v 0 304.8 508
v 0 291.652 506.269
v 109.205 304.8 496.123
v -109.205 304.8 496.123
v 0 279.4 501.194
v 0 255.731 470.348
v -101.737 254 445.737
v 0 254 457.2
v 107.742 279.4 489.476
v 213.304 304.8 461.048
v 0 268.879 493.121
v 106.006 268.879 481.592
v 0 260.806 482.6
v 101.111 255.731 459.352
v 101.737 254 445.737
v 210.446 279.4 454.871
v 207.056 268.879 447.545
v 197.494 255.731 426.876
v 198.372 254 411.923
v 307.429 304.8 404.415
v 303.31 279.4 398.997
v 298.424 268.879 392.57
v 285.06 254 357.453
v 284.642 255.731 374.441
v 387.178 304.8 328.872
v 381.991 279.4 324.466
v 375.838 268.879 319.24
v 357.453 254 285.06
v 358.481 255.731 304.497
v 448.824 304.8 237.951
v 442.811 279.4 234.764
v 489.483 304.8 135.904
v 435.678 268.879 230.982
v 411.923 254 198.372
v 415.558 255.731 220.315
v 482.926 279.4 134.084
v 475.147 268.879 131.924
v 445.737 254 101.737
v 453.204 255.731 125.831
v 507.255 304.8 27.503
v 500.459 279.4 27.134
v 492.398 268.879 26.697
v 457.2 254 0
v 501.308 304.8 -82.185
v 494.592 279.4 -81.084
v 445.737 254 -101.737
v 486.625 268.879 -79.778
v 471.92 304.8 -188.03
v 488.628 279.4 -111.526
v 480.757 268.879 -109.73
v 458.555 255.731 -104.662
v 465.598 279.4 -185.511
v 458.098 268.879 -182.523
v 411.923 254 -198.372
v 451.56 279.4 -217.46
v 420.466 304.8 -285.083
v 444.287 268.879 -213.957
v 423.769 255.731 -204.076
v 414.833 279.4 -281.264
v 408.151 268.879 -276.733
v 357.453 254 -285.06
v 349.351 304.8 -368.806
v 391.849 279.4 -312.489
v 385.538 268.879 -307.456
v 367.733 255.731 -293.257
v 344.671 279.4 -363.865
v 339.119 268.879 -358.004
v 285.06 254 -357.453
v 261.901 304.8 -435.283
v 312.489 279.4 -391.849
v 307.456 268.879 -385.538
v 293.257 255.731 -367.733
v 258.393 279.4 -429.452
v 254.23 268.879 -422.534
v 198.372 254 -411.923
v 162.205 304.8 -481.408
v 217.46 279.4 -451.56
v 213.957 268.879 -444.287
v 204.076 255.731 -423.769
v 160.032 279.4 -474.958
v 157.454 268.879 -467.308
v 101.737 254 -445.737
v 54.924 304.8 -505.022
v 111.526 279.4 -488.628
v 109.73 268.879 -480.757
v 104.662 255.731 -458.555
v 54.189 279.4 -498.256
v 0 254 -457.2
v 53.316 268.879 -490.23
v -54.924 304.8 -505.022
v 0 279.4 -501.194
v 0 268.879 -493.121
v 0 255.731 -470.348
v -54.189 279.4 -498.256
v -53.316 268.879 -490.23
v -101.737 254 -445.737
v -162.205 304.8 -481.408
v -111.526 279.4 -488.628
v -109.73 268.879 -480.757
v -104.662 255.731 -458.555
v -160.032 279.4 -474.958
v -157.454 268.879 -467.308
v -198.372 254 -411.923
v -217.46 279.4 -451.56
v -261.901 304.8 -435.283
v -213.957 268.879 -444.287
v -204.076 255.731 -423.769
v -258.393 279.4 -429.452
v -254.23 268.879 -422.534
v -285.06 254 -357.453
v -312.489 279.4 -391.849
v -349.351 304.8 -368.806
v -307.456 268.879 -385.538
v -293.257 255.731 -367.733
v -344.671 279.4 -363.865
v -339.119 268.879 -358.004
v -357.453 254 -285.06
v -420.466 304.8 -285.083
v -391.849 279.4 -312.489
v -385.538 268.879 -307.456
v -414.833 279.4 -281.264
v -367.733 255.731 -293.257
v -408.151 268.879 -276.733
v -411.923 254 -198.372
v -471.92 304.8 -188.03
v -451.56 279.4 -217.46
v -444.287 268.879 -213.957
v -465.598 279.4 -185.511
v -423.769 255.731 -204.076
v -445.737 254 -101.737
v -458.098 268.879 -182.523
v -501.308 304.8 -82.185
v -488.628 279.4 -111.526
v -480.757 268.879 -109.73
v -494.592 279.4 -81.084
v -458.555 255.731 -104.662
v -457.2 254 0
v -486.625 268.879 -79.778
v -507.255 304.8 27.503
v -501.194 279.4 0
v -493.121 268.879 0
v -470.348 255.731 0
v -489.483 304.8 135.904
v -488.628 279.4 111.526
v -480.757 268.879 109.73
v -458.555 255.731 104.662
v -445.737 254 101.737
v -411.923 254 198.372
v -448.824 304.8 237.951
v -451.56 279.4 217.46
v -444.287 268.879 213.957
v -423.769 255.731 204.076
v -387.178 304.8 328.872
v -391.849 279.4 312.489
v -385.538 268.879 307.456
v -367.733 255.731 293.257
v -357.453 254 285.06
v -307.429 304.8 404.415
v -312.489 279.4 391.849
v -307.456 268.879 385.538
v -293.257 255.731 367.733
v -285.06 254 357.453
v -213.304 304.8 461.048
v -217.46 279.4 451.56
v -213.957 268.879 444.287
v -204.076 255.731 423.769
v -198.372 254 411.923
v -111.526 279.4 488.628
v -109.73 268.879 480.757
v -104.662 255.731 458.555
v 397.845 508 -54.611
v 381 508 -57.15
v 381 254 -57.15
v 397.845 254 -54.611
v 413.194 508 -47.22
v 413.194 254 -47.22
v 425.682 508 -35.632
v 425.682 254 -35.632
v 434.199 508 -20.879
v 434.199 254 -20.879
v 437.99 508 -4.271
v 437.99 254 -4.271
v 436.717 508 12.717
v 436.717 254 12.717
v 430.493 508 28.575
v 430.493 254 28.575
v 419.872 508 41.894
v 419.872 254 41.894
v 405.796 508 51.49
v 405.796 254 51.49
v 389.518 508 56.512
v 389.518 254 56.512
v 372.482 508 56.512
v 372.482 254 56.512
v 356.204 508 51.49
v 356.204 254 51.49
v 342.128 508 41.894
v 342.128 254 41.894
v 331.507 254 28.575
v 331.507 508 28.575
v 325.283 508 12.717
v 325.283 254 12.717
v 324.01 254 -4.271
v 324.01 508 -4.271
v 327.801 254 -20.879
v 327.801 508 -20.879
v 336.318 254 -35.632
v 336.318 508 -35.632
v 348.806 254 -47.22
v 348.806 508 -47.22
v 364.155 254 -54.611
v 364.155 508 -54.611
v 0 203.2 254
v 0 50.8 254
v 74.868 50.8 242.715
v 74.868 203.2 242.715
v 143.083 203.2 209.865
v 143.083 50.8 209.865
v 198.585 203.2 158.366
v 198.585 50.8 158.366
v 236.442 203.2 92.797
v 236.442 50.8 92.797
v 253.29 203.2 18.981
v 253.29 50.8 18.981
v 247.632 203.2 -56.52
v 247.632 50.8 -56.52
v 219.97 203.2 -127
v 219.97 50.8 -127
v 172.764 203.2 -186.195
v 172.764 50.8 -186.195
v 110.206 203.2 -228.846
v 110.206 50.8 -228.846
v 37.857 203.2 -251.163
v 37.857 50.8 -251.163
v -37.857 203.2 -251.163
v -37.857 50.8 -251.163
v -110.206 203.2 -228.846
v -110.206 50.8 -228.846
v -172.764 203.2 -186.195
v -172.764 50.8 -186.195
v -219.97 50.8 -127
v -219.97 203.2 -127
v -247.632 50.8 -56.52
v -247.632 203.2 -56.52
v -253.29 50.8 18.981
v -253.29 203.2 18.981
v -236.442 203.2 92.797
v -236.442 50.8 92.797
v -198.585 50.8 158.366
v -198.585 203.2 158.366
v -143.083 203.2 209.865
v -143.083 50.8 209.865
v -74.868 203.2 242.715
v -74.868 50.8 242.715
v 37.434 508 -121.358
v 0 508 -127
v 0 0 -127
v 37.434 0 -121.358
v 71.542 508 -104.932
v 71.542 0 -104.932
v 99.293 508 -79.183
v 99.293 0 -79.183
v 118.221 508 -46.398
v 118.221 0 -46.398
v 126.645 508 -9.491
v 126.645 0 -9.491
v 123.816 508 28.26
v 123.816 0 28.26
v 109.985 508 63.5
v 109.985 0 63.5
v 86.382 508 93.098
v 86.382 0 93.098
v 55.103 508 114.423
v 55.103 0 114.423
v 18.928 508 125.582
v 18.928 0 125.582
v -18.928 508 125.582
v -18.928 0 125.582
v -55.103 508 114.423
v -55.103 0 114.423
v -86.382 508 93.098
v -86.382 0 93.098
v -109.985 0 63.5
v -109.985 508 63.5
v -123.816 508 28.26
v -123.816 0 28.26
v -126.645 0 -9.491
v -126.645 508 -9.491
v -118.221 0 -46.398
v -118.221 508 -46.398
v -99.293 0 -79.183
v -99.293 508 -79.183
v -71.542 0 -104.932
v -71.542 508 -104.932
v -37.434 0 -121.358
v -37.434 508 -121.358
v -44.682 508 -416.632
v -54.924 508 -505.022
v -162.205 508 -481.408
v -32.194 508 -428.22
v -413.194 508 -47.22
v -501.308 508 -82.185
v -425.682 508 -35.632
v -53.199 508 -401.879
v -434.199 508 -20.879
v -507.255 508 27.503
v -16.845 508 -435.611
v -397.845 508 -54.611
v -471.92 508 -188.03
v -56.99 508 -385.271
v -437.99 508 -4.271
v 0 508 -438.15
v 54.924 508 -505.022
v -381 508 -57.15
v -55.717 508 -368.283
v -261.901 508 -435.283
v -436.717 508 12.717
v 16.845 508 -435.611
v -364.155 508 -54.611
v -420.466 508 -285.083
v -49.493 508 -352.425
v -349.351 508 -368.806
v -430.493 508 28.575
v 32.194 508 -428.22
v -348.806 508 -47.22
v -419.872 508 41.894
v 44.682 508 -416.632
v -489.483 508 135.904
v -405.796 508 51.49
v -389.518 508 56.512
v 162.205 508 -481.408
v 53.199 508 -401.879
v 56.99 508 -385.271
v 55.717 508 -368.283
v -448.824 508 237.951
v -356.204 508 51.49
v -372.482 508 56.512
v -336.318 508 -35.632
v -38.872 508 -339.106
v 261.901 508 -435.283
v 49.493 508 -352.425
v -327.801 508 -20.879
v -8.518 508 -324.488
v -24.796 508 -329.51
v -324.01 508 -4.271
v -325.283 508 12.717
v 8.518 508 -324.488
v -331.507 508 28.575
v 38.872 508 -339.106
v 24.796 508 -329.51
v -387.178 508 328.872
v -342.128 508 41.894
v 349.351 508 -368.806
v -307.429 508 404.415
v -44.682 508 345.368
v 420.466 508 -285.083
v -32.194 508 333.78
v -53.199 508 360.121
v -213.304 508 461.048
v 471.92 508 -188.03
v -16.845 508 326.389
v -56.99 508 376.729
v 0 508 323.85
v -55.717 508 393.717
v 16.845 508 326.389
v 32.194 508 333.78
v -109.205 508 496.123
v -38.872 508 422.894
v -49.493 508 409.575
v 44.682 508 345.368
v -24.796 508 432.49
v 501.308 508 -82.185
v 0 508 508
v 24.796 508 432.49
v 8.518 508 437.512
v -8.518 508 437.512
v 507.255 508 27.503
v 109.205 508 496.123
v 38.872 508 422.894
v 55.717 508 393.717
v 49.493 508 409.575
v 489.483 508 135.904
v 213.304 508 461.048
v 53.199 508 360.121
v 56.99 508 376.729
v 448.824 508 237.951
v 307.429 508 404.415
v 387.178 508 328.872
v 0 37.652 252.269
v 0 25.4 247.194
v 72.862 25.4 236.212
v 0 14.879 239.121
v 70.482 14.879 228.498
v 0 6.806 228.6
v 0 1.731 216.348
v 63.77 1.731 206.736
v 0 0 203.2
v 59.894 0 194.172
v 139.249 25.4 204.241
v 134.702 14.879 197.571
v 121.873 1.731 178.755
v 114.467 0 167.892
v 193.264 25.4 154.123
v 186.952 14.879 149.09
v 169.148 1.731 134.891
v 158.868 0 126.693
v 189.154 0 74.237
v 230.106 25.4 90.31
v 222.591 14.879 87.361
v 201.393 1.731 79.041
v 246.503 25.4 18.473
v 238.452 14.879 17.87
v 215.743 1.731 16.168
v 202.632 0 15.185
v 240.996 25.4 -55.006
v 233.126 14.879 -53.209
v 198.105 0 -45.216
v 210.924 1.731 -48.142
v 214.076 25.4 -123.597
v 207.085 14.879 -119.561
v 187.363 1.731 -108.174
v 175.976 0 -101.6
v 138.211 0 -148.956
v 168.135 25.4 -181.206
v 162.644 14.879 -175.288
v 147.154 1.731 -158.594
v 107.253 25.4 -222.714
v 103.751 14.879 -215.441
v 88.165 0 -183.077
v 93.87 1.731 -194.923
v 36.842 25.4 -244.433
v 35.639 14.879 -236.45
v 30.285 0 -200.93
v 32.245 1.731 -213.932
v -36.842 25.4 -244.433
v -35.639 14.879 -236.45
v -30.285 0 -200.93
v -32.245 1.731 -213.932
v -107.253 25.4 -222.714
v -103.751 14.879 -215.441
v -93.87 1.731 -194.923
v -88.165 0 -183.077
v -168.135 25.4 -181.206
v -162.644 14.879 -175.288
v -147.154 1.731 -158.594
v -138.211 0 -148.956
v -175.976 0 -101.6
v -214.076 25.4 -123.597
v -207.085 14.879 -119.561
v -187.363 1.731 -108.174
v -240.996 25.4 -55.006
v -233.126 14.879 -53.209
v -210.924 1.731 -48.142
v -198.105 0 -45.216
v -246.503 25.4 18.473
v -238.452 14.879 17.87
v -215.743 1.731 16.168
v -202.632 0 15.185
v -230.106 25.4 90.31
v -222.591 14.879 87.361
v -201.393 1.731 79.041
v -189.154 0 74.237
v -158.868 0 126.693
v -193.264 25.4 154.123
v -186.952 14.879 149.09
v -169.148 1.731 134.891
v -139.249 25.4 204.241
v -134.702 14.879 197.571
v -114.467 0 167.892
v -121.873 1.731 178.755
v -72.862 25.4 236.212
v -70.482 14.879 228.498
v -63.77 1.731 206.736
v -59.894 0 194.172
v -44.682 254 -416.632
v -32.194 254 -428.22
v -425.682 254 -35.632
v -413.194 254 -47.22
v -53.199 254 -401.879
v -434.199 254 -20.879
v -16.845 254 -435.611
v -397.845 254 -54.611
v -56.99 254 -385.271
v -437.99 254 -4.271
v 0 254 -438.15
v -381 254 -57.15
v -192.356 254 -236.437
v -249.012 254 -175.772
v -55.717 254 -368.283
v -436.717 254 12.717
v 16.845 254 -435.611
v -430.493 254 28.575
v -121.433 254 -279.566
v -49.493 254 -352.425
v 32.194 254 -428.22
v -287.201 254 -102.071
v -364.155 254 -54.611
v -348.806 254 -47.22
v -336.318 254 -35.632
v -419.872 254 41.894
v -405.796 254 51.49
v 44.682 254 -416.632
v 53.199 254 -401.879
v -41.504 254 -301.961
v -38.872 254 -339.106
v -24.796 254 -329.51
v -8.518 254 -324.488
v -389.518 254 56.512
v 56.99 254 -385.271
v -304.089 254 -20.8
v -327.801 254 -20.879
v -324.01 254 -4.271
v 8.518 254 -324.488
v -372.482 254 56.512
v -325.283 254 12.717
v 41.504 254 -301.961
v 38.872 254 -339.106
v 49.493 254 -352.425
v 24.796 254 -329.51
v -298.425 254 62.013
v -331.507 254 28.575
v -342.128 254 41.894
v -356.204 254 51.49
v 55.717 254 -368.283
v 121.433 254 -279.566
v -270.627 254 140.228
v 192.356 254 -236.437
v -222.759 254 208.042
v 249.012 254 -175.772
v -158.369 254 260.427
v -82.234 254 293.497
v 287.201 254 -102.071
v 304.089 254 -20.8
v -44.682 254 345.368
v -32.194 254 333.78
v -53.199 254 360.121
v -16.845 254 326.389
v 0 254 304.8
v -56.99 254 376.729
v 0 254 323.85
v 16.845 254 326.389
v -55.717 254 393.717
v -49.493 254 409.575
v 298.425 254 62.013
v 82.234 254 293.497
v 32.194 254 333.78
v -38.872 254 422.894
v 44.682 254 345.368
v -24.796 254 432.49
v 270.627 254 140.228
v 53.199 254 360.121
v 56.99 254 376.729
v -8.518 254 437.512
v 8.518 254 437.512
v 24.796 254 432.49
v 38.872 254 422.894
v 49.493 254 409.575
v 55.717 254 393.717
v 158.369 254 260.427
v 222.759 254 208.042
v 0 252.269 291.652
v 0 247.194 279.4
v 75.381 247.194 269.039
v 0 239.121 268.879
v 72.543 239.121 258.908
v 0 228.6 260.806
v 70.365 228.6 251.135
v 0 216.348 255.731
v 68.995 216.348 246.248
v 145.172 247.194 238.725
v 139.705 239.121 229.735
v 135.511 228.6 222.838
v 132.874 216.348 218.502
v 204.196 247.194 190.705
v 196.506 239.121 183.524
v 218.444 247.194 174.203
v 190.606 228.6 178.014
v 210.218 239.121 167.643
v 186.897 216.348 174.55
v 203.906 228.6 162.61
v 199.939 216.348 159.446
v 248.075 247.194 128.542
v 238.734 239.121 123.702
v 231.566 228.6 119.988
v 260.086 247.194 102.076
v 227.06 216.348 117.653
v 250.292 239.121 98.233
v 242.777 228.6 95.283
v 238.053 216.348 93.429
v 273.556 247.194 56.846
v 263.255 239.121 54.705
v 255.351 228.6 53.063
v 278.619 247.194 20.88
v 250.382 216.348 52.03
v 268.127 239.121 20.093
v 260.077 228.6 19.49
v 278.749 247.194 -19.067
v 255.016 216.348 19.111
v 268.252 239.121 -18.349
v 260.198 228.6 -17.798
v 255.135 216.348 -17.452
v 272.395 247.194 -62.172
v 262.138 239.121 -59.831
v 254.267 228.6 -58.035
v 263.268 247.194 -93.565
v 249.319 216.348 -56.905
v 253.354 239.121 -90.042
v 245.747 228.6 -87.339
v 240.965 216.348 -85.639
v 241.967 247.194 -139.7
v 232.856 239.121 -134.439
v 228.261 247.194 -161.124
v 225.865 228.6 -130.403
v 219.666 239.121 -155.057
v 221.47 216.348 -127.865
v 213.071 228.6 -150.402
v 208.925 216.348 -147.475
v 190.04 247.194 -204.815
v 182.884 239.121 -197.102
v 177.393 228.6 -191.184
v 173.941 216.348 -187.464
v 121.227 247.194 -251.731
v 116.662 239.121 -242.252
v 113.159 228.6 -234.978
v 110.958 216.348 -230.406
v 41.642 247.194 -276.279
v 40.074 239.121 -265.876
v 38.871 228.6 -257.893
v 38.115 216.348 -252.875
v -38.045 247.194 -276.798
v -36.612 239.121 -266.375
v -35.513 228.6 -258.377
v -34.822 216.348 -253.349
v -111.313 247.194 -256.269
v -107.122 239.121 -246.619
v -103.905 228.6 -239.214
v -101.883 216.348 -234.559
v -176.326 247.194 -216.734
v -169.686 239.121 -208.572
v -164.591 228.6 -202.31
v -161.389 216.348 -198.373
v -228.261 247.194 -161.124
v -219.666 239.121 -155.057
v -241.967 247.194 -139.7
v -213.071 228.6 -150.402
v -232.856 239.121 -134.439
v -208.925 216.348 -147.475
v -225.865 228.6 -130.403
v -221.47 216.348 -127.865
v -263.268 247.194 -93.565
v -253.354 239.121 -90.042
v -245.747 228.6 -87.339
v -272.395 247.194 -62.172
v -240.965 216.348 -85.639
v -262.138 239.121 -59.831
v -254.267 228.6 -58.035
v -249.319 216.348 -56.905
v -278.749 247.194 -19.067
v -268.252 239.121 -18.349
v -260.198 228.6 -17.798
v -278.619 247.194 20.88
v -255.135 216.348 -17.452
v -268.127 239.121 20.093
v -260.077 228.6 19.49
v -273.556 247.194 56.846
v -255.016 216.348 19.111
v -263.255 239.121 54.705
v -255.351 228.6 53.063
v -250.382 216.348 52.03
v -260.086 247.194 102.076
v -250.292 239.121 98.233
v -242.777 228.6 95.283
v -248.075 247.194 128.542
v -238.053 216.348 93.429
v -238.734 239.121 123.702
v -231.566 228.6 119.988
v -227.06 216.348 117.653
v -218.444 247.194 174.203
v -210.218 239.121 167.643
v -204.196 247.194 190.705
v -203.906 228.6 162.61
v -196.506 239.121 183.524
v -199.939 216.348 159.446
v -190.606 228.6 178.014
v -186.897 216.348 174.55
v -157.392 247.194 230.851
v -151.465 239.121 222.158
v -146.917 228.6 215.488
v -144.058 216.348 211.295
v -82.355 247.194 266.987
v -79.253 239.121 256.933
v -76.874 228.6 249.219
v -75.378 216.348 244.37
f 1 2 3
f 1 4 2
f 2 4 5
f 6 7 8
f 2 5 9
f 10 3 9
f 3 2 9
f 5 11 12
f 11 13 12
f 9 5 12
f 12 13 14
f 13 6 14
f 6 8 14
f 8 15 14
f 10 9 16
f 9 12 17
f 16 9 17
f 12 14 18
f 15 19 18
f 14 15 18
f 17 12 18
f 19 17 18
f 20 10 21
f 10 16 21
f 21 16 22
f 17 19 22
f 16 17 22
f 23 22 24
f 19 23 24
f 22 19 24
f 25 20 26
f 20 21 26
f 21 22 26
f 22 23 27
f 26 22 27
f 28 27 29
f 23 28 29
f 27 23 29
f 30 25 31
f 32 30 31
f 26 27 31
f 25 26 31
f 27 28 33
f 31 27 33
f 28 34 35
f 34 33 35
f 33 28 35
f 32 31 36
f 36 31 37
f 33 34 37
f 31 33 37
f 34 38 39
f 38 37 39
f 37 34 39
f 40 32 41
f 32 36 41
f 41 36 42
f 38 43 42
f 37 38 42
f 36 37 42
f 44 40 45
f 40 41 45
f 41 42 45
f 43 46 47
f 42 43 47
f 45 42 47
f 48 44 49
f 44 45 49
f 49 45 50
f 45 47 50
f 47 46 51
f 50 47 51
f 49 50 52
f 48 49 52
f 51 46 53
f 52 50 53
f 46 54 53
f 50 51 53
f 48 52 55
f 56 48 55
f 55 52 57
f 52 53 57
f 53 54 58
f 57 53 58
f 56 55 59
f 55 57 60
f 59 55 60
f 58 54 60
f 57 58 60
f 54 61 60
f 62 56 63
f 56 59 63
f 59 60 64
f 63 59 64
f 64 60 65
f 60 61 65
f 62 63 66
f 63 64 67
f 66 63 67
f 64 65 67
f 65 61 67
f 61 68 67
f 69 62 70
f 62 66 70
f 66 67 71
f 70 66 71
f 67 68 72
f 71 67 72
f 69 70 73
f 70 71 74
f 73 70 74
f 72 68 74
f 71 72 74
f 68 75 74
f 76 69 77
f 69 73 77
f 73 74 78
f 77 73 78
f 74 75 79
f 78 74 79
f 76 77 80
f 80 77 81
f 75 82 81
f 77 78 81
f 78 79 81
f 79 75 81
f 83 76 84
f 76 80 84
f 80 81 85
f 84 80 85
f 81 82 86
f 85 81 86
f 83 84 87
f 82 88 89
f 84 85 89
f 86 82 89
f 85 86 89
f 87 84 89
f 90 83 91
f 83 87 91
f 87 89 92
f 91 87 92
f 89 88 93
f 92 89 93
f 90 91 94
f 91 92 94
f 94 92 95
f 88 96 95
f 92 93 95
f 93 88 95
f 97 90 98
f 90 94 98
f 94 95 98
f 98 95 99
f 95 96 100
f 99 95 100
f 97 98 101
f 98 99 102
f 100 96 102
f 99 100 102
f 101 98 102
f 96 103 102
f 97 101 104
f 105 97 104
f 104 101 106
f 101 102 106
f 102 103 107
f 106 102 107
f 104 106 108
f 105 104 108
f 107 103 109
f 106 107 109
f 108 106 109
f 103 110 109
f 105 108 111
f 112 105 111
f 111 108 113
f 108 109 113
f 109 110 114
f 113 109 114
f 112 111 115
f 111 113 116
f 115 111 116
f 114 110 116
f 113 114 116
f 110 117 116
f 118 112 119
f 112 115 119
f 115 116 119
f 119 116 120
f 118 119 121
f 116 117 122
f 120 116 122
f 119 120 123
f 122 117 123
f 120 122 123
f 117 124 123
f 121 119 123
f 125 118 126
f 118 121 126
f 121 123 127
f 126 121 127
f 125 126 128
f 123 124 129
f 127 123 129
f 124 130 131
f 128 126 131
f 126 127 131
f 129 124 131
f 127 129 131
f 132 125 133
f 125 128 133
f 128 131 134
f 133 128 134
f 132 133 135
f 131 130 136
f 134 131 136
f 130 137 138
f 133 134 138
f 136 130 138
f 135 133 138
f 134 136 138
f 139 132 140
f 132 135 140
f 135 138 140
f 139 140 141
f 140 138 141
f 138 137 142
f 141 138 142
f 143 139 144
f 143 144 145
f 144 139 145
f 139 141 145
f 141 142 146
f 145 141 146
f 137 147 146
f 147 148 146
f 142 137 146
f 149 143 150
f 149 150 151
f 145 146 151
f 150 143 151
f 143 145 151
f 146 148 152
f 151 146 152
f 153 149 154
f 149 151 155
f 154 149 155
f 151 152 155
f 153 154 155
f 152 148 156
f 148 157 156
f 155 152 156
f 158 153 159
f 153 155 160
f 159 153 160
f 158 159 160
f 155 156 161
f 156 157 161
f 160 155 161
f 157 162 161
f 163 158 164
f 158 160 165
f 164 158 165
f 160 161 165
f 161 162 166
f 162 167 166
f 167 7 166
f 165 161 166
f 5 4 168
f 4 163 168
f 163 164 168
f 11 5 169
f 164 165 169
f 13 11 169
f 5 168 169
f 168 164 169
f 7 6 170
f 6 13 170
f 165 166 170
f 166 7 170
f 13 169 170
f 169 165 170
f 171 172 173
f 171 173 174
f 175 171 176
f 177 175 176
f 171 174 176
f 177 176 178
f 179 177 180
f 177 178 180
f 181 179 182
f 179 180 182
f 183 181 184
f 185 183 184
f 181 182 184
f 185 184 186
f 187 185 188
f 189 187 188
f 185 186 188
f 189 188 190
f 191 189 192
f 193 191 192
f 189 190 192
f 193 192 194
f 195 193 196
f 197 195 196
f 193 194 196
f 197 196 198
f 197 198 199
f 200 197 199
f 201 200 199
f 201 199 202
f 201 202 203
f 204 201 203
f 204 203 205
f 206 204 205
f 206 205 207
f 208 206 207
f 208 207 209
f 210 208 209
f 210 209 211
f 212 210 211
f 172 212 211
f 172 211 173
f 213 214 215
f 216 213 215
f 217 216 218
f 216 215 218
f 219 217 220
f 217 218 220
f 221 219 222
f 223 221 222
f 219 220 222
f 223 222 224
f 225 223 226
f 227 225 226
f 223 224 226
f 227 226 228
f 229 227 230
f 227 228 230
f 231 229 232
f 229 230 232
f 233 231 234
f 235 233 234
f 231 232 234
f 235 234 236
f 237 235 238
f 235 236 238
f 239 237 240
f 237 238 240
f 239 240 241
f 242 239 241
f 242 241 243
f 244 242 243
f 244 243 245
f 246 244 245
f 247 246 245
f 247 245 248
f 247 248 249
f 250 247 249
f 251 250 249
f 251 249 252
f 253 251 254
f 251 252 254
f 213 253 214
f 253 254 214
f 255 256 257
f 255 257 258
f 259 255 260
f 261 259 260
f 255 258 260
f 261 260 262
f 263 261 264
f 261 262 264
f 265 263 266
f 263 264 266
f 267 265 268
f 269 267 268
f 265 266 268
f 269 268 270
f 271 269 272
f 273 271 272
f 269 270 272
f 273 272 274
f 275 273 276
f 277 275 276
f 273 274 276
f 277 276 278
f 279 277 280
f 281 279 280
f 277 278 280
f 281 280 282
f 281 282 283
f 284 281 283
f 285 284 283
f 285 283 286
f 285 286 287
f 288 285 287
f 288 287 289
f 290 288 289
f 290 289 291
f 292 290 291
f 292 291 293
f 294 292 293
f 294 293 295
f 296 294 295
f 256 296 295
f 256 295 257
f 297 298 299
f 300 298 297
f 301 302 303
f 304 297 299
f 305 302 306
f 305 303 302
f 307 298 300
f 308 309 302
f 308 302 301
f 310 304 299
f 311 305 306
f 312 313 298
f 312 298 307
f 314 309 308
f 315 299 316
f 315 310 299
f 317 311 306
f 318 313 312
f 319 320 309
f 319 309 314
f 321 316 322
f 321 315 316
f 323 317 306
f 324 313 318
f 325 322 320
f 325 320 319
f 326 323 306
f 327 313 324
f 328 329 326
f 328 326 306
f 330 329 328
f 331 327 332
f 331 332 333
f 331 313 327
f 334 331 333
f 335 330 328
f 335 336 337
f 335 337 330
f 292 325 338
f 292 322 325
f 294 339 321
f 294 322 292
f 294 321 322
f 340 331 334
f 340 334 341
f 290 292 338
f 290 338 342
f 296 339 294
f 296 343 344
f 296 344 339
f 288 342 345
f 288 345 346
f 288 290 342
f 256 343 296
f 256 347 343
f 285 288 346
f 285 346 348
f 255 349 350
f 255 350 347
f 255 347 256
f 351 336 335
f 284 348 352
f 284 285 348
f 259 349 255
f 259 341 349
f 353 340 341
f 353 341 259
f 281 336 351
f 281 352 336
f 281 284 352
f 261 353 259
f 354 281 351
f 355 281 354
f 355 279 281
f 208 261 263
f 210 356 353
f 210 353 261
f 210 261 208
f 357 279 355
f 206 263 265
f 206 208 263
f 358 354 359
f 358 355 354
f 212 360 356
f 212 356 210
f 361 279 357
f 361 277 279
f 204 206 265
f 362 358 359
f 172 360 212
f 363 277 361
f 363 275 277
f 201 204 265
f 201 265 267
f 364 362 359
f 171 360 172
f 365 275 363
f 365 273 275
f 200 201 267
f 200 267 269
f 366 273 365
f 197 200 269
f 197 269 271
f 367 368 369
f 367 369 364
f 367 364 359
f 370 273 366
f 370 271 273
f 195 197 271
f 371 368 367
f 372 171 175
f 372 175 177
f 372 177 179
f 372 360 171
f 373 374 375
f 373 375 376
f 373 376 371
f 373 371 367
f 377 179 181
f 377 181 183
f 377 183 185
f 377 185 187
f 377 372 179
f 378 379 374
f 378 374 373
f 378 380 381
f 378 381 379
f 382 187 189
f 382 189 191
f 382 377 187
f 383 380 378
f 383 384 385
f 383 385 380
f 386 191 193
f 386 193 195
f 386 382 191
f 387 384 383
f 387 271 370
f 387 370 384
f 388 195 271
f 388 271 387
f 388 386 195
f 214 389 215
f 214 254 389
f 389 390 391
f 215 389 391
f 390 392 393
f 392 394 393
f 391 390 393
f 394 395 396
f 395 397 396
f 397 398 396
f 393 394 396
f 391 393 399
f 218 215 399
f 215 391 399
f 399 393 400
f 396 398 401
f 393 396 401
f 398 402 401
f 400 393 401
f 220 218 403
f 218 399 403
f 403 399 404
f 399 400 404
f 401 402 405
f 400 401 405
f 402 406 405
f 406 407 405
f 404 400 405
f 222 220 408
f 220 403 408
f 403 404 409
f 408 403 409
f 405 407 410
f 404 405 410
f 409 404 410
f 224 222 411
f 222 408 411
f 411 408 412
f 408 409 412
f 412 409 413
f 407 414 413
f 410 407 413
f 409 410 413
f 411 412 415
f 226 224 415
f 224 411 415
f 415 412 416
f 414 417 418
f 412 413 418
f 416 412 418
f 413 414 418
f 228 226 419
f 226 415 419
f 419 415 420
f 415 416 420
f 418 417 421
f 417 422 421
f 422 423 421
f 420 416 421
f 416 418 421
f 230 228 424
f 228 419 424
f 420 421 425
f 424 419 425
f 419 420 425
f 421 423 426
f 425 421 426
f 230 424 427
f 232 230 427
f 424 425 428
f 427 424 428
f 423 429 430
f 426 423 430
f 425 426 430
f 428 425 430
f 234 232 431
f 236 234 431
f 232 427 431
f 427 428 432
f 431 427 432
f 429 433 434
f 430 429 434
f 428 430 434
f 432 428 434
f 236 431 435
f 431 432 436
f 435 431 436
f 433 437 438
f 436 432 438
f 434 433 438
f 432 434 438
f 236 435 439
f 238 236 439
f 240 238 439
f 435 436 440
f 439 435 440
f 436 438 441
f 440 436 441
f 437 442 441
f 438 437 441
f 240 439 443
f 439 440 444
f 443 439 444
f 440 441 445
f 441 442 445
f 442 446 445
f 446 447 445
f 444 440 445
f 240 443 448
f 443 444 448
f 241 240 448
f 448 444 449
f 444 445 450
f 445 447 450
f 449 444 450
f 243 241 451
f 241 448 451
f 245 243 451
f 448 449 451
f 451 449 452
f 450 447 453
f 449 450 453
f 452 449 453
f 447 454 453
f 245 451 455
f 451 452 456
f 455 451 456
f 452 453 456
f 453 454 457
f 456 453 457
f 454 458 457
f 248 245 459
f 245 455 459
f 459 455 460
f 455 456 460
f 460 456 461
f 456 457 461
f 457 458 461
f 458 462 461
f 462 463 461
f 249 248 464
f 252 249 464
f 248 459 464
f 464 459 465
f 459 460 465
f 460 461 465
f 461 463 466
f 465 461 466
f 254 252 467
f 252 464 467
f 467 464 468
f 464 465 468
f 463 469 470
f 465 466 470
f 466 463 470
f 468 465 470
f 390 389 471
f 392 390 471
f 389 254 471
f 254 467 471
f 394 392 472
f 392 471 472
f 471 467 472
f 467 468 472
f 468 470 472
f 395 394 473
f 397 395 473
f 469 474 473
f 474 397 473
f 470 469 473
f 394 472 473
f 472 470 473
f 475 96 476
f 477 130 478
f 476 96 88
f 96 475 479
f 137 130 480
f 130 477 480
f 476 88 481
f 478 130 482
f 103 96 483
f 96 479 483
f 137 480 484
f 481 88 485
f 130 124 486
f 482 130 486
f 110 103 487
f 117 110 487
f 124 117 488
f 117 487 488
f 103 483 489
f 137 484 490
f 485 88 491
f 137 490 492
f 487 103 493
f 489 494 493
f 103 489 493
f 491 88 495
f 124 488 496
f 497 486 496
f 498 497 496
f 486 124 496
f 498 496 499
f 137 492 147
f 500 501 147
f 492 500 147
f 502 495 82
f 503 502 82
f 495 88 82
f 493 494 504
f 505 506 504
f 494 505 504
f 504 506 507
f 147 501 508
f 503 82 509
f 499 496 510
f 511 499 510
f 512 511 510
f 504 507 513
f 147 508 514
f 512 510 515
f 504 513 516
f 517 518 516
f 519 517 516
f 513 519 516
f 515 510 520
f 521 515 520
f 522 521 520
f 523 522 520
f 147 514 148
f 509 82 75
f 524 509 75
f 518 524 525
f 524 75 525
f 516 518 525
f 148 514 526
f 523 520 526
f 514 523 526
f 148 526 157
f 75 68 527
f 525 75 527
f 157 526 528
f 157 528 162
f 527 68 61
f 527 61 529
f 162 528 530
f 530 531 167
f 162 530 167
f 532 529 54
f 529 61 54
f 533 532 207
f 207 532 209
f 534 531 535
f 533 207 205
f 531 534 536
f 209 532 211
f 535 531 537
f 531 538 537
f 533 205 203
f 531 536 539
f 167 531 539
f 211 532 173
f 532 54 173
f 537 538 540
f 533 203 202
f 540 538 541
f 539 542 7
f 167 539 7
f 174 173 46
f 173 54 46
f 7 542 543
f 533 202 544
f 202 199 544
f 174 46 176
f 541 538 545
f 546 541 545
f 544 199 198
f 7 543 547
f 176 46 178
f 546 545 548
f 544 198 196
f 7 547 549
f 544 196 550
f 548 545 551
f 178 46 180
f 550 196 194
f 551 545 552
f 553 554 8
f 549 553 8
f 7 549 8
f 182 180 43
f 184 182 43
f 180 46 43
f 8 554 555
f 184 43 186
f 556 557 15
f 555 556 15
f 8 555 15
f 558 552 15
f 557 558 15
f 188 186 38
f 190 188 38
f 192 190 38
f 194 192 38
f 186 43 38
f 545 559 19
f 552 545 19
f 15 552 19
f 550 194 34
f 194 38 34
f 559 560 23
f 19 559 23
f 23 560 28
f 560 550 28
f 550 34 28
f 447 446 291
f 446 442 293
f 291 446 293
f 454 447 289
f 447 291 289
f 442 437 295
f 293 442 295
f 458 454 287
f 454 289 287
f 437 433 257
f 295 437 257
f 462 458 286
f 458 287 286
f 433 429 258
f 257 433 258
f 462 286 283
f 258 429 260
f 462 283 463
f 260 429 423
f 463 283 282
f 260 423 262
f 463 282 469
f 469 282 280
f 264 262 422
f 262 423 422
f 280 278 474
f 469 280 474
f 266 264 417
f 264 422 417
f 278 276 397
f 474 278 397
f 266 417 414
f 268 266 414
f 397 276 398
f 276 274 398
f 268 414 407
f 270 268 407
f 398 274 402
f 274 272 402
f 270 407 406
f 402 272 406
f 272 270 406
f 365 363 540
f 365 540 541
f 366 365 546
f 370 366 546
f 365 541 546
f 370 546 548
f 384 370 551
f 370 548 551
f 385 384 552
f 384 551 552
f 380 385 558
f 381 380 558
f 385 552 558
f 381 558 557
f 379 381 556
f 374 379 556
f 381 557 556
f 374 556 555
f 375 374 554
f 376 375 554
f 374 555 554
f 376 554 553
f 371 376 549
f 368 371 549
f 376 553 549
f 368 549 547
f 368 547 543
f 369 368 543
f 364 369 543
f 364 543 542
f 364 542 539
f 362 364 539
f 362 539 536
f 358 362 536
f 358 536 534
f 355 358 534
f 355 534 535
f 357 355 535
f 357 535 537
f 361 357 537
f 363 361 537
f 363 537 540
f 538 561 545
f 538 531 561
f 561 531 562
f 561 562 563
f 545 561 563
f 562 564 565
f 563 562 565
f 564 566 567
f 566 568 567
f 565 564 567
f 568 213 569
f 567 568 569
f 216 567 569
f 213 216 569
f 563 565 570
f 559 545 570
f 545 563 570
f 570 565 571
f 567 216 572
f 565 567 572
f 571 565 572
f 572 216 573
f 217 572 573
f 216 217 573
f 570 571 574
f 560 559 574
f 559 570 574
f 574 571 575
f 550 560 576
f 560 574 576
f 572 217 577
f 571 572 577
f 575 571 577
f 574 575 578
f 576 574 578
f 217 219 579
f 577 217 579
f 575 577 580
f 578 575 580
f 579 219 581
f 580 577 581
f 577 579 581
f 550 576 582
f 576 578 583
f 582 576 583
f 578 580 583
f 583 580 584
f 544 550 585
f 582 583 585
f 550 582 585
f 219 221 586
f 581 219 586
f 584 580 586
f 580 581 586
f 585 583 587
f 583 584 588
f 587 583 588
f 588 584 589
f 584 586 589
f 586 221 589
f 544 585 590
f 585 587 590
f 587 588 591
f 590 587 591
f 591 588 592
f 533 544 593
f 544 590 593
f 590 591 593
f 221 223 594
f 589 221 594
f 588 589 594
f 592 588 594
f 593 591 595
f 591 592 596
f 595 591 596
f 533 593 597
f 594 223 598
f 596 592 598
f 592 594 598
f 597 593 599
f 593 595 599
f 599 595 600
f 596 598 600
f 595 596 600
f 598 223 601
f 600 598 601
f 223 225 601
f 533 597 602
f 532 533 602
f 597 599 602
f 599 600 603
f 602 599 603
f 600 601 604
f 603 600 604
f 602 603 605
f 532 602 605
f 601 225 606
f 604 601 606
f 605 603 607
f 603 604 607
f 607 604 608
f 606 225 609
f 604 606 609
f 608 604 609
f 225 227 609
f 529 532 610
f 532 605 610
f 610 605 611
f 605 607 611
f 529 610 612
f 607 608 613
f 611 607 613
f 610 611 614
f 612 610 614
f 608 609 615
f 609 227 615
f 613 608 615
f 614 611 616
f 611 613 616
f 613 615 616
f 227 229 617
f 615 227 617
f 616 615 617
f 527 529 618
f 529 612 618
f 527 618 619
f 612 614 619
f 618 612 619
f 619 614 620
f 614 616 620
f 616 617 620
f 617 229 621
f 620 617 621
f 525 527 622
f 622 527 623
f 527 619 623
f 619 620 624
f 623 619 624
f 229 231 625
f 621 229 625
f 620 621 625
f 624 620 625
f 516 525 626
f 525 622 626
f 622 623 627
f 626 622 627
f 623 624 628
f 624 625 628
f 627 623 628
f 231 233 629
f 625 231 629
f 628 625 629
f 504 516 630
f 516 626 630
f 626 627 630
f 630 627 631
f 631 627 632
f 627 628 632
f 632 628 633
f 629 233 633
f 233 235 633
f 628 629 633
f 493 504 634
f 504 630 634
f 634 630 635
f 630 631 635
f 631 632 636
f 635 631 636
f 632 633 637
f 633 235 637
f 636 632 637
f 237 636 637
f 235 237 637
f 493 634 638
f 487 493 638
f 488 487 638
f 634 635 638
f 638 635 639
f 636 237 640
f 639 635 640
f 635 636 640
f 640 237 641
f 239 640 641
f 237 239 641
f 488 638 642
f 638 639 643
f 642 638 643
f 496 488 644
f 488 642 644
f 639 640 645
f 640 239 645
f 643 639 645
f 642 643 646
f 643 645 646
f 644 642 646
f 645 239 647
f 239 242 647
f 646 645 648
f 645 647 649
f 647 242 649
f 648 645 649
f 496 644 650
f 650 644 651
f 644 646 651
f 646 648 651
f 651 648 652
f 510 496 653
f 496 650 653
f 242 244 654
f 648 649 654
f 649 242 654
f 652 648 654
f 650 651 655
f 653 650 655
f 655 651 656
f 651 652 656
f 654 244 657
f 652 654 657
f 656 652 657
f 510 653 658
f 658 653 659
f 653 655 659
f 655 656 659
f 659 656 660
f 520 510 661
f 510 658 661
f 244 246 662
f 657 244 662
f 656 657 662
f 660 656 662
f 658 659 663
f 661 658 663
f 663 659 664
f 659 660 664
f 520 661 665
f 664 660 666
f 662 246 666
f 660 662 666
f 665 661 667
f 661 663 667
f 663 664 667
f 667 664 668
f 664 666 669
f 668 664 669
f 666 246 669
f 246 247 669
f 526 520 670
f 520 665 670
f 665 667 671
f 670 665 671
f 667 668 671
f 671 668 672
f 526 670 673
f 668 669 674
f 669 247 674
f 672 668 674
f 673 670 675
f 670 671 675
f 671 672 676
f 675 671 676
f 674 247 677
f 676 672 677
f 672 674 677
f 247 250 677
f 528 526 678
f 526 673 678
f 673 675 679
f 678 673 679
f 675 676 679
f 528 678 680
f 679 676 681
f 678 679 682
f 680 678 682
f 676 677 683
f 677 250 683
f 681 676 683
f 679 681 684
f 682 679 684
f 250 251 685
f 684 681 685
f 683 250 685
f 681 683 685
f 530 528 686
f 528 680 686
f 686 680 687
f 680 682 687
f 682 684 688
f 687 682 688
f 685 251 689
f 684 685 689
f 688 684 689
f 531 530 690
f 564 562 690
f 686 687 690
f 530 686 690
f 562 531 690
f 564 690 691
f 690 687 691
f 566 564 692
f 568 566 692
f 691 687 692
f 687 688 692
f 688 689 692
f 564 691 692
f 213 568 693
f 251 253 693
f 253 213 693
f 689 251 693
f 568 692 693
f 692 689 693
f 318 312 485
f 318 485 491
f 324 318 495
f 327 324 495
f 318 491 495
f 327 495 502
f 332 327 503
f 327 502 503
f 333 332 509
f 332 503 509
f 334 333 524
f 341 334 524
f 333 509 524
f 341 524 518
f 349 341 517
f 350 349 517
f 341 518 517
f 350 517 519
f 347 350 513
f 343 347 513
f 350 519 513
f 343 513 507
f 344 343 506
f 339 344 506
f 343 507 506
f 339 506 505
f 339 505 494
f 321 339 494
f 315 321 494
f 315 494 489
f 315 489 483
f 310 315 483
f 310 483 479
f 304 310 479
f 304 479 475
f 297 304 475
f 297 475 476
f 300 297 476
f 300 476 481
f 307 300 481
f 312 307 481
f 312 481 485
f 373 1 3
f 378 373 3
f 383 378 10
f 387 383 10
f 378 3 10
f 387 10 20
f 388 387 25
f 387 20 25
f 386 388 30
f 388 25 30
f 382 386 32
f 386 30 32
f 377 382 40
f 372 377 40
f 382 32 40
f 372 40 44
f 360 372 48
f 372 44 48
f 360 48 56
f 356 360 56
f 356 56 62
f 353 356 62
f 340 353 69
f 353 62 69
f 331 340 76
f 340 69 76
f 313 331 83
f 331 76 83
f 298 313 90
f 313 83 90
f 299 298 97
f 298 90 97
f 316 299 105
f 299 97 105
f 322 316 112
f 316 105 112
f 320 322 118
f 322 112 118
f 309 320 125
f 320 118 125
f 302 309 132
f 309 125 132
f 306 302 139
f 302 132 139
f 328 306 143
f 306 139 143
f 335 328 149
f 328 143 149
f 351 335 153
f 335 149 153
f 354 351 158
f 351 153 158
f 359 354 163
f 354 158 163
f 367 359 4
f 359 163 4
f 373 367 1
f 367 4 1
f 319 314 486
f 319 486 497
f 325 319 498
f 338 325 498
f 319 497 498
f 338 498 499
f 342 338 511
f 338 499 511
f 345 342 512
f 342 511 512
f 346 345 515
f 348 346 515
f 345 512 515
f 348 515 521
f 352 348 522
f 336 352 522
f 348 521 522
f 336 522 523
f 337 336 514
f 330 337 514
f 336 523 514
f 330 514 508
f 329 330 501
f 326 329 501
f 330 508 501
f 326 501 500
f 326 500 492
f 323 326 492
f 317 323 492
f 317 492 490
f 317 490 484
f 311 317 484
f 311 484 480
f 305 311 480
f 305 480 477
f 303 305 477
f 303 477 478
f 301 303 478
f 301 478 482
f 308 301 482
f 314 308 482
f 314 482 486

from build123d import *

# Parameters (mm, degrees)
SKETCH1_R           = 254
BOSS_EXTRUDE1_DEPTH = 254
SKETCH2_R           = 508
BOSS_EXTRUDE2_DEPTH = 254
SKETCH3_R           = 127
CUT_EXTRUDE1_DEPTH  = 880.881810245
SKETCH4_R           = 57.15
CUT_EXTRUDE2_DEPTH  = 763
FILLET1_R           = 50.8


with BuildPart() as part:
    # Sketch1 → Boss-Extrude1 (new body)
    with BuildSketch(Plane(origin=(0, 0, 0), x_dir=(1, 0, 0), z_dir=(0, 1, 0))):
        with Locations(Location((0, 0, 0), (0, 0, 270))):
            Circle(SKETCH1_R)
    extrude(amount=BOSS_EXTRUDE1_DEPTH)

    # Sketch2 → Boss-Extrude2 (add)
    with BuildSketch(Plane(origin=(0, 254, 0), x_dir=(1, 0, 0), z_dir=(0, 1, 0))):
        with Locations(Location((0, 0, 0), (0, 0, 270))):
            Circle(SKETCH2_R)
    extrude(amount=BOSS_EXTRUDE2_DEPTH)

    # Sketch3 → Cut-Extrude1 (cut, through all)
    with BuildSketch(Plane.XZ):
        with Locations(Location((0, 0, 0), (0, 0, 270))):
            Circle(SKETCH3_R)
    extrude(amount=-CUT_EXTRUDE1_DEPTH, mode=Mode.SUBTRACT)

    # Sketch4 → Cut-Extrude2 (cut, through all)
    with BuildSketch(Plane.XZ.offset(-254)):
        with Locations(Location((0, -381, 0), (0, 0, 270))):
            Circle(SKETCH4_R)
        with Locations(Location((381, 0, 0), (0, 0, 270))):
            Circle(SKETCH4_R)
        with Locations(Location((0, 381, 0), (0, 0, 270))):
            Circle(SKETCH4_R)
        with Locations(Location((-381, 0, 0), (0, 0, 270))):
            Circle(SKETCH4_R)
    extrude(amount=-CUT_EXTRUDE2_DEPTH, mode=Mode.SUBTRACT)

    # Fillet1
    fillet1_edges = [part.edges().sort_by_distance(p)[0] for p in [
        (0, 0, -254),
        (0, 254, -254),
        (0, 254, -508),
    ]]
    fillet(fillet1_edges, radius=FILLET1_R)


solid = part.part
